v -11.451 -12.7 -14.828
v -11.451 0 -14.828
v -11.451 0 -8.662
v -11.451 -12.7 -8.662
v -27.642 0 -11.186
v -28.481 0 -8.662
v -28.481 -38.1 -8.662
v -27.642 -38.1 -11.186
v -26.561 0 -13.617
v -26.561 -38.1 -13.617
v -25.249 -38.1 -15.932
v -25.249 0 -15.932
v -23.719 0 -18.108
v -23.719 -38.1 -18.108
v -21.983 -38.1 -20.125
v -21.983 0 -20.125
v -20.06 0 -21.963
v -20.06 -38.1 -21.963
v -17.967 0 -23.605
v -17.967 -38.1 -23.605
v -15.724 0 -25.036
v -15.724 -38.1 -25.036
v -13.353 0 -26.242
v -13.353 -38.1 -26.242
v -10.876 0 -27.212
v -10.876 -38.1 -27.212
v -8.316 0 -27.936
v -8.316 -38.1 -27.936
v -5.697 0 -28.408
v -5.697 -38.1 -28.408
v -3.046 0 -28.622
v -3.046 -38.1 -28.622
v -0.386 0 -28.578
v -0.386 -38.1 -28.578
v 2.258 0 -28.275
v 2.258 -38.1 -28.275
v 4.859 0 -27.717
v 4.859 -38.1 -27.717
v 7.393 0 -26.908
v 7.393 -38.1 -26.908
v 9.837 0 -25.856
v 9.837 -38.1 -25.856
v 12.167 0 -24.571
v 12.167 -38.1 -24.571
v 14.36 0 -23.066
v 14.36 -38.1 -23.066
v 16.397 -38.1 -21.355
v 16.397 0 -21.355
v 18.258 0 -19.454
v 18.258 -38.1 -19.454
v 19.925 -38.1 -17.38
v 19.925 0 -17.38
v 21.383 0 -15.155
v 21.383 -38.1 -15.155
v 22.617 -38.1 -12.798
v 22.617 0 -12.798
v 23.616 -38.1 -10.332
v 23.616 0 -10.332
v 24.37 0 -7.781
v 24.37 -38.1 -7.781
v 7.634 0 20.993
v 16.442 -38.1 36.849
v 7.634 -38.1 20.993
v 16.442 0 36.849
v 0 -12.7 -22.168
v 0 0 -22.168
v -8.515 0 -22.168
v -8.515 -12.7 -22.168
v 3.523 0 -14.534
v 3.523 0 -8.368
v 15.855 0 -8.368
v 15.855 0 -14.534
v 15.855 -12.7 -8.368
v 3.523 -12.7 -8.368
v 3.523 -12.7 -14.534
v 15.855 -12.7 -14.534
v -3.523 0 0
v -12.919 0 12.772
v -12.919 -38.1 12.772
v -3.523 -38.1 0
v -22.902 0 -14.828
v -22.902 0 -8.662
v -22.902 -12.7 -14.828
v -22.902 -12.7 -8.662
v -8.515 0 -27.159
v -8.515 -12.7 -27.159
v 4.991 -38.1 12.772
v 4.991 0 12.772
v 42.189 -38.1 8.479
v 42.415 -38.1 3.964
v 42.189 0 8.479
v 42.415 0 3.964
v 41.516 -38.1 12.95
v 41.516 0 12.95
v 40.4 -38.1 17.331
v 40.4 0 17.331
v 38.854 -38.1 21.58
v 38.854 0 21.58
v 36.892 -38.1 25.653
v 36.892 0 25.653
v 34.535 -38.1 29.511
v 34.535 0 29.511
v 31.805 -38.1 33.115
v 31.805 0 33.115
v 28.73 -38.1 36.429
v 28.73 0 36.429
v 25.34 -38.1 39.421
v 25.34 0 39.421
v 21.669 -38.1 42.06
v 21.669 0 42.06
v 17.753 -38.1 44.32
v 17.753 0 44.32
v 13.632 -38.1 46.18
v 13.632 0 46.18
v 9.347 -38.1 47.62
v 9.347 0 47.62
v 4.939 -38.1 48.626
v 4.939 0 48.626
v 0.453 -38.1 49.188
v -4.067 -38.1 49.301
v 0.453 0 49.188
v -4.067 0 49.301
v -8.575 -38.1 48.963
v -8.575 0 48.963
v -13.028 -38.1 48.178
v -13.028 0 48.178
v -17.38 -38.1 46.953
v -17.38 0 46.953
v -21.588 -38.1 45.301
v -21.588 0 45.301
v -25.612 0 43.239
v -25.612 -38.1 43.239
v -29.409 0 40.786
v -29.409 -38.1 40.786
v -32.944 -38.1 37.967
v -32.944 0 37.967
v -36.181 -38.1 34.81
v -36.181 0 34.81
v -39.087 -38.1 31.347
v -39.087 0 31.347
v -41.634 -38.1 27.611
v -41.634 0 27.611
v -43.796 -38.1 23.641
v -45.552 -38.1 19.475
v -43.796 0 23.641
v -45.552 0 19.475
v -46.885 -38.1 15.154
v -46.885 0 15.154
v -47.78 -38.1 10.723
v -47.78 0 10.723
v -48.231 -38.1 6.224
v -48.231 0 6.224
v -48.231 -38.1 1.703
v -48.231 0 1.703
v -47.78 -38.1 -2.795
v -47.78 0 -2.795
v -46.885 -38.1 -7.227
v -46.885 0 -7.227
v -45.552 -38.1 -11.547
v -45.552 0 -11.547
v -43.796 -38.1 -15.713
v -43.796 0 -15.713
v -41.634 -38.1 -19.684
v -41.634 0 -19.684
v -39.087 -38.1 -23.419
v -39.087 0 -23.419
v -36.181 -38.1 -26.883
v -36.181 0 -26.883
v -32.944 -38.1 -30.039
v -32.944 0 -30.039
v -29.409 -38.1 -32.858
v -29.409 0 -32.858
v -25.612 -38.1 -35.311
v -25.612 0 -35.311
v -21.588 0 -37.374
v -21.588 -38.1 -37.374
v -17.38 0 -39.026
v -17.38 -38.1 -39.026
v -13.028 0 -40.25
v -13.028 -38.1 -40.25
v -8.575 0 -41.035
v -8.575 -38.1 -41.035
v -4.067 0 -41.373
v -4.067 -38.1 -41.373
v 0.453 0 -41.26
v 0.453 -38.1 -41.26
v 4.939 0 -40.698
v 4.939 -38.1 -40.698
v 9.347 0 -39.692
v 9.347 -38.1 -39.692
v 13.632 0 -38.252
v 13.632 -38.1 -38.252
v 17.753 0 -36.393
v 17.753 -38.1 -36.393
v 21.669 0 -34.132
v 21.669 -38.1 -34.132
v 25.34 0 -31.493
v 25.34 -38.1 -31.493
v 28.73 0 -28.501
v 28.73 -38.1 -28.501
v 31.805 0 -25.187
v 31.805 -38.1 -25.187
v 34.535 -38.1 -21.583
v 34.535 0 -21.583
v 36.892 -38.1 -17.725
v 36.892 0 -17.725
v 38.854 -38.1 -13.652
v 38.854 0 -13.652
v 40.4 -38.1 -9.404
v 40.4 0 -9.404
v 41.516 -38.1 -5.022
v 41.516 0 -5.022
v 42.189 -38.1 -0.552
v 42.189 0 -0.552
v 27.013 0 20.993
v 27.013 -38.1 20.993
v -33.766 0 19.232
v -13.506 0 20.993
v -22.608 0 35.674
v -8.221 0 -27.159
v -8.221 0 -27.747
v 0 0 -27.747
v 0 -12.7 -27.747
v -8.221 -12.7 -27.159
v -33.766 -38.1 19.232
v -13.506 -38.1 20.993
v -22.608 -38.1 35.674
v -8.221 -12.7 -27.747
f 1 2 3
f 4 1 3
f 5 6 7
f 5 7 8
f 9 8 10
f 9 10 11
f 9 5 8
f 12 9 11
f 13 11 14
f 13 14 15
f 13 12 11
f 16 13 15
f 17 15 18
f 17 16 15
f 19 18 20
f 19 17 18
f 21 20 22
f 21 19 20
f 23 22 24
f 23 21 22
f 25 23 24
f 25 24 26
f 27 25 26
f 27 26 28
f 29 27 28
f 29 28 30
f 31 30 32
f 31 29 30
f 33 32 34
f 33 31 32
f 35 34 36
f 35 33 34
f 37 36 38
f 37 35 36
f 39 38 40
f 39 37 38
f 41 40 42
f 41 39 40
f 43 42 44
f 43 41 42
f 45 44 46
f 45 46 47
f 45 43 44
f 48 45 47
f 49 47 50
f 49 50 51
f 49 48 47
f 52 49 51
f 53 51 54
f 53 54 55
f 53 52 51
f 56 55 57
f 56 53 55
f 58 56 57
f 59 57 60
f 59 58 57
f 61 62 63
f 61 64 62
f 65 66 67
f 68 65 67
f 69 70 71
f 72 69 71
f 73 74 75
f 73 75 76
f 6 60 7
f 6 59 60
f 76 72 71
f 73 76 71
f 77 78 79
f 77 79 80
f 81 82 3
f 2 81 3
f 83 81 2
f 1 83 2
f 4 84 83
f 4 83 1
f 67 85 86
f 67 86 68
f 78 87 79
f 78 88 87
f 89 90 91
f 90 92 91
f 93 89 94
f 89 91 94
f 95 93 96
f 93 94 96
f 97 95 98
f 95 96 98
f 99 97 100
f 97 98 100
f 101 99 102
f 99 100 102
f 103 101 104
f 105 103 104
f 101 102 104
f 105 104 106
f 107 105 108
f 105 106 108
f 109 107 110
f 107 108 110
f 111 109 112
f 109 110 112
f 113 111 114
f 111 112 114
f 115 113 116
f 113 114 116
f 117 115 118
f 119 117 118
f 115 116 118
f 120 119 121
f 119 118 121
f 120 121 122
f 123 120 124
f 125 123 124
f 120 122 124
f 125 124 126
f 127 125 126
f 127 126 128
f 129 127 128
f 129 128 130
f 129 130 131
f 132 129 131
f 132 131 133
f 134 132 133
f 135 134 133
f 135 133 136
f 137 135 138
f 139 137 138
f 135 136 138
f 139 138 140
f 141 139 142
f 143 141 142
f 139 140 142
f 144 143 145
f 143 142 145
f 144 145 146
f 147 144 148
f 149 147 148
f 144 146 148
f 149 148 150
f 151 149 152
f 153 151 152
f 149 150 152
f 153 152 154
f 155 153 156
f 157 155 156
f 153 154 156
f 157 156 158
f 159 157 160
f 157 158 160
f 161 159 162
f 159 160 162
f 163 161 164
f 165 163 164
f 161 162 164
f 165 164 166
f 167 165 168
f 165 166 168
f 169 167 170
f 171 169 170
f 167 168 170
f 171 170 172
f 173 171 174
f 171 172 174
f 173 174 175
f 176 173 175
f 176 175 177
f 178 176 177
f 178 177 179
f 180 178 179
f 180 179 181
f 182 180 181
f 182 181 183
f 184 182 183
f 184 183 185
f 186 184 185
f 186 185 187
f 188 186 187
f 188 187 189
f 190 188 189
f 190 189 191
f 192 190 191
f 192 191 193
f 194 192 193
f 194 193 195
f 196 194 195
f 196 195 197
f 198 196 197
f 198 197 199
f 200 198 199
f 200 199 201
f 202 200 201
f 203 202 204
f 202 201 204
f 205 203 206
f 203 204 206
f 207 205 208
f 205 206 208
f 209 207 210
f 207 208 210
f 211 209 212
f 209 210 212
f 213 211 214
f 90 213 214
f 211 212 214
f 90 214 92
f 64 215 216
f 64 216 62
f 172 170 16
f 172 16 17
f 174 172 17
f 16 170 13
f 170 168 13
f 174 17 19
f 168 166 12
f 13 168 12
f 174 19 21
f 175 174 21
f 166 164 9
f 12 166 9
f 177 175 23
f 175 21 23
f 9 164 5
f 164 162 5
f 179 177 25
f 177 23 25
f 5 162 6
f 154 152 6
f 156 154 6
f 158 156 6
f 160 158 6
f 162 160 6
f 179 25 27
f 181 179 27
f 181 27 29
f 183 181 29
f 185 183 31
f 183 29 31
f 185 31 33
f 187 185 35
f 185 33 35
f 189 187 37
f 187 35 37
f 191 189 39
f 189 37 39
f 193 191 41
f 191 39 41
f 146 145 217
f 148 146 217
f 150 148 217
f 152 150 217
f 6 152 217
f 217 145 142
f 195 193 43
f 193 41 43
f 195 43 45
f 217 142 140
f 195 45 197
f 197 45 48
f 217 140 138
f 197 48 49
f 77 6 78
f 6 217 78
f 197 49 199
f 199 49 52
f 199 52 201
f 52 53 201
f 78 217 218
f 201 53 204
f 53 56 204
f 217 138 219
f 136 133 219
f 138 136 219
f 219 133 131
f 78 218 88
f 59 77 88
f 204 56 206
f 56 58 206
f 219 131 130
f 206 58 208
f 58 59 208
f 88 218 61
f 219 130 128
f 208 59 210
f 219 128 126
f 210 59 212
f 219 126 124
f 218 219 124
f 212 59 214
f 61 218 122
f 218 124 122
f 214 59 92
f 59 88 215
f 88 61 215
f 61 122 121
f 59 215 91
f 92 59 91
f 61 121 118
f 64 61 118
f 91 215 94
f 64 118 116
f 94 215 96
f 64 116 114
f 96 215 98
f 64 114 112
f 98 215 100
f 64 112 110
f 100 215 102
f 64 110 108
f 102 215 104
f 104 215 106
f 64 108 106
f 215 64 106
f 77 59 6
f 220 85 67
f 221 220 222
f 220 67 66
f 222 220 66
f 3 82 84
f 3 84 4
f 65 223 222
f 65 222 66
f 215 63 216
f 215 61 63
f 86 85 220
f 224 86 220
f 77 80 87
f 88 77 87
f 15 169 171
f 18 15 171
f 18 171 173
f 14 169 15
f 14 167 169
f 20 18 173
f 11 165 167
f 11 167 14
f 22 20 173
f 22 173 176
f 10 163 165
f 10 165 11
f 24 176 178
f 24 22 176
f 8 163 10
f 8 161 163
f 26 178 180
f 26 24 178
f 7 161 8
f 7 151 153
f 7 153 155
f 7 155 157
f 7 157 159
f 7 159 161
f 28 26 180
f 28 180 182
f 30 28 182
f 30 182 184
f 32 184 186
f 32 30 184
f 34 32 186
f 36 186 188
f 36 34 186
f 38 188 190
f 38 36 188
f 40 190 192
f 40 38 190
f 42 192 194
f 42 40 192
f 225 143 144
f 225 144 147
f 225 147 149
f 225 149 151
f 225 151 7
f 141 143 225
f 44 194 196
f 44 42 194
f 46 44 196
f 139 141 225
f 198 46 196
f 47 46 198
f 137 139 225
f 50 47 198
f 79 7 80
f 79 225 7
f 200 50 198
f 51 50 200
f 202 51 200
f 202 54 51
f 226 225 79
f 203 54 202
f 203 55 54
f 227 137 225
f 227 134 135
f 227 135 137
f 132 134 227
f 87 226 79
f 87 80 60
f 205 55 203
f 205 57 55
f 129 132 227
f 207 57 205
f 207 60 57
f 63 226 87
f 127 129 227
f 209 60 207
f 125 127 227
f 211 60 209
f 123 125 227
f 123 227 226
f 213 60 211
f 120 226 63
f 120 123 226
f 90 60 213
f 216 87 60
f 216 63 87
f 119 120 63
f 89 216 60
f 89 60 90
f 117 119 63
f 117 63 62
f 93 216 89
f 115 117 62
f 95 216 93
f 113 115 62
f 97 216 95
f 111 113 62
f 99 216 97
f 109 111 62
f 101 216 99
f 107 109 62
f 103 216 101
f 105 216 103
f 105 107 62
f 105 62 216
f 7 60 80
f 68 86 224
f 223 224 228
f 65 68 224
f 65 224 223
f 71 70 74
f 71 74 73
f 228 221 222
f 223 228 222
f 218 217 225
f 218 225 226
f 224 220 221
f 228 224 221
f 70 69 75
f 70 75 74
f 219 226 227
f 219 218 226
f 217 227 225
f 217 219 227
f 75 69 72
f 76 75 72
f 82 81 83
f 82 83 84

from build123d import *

# Parameters (mm, degrees)
F0_R      = 45.3508771991
F1_DEPTH  = 12.7
F3_DEPTH  = 12.7
F5_DEPTH  = 12.7
F7_DEPTH  = 12.7
F9_DEPTH  = 25.4
F10_DEPTH = 25.4
F11_W     = 11.4509724081
F11_H     = 6.1659086496
F12_DEPTH = 12.7
F11_W_2   = 12.3318159021
F11_H_2   = 6.1659077182
F11_W_3   = 8.2212118432
F11_H_3   = 4.9914494157
F11_H_4   = 0.5872286856
F11_W_4   = 0.2936143428


with BuildPart() as f1:
    # F0 (on Front) → F1 (new body)
    with BuildSketch(Plane.XZ):
        with Locations((-2.9361471534, 3.9637982845)):
            Circle(F0_R)
    extrude(amount=F1_DEPTH)

    # F2 (on face) → F3 (cut)
    with BuildSketch(Plane.XZ.offset(12.7)):
        Polygon((-22.6083304733, 35.6741845608), (-33.7656885386, 19.2317608744), (-13.5062746704, 20.9934487939), align=None)
    extrude(amount=-F3_DEPTH, mode=Mode.SUBTRACT)

    # F4 (on face) → F5 (cut)
    with BuildSketch(Plane.XZ.offset(12.7)):
        Polygon((7.6339817606, 20.9934487939), (27.0125493407, 20.9934487939), (16.4424236864, 36.848641932), align=None)
    extrude(amount=-F5_DEPTH, mode=Mode.SUBTRACT)

    # F6 (on face) → F7 (cut)
    with BuildSketch(Plane.XZ.offset(12.7)):
        with BuildLine():
            Line((24.3700183928, -7.780788932), (-28.4806247801, -8.6616333574))
            ThreePointArc((-28.4806247801, -8.6616333574), (-1.715112134, -28.6326660899), (24.3700183928, -7.780788932))
        make_face()
    extrude(amount=-F7_DEPTH, mode=Mode.SUBTRACT)

    # F8 (on face) → F9 (cut)
    with BuildSketch(Plane.XZ.offset(12.7)):
        Polygon((4.991450347, 12.7722388133), (-12.9190450534, 12.7722388133), (-3.5233763047, 0), align=None)
    extrude(amount=-F9_DEPTH, mode=Mode.SUBTRACT)

    # F10 (add): a face of the model
    f10_faces = [f1.faces().sort_by_distance(p)[0] for p in [
        (-47.0043078405, -12.7, 3.9637982845),
    ]]
    extrude(f10_faces, amount=F10_DEPTH)


with BuildPart() as f12:
    # F11 (on Front) → F12 (new body)
    with BuildSketch(Plane.XZ):
        with Locations((-17.1764586121, -11.7445876822)):
            Rectangle(F11_W, F11_H)
    extrude(amount=F12_DEPTH)


with BuildPart() as f12b:
    # F11 (on Front) → F12, piece 2 (new body)
    with BuildSketch(Plane.XZ):
        with Locations((9.6892851871, -11.4509719424)):
            Rectangle(F11_W_2, F11_H_2)
    extrude(amount=F12_DEPTH)


with BuildPart() as f12c:
    # F11 (on Front) → F12, piece 3 (new body)
    with BuildSketch(Plane.XZ):
        with Locations((-4.1106059216, -24.6636345983)):
            Rectangle(F11_W_3, F11_H_3)
        with Locations((-4.1106059216, -27.4529736489)):
            Rectangle(F11_W_3, F11_H_4)
        with Locations((-8.3680190146, -24.6636345983)):
            Rectangle(F11_W_4, F11_H_3)
    extrude(amount=F12_DEPTH)


solid = Compound([f1.part, f12.part, f12b.part, f12c.part])
